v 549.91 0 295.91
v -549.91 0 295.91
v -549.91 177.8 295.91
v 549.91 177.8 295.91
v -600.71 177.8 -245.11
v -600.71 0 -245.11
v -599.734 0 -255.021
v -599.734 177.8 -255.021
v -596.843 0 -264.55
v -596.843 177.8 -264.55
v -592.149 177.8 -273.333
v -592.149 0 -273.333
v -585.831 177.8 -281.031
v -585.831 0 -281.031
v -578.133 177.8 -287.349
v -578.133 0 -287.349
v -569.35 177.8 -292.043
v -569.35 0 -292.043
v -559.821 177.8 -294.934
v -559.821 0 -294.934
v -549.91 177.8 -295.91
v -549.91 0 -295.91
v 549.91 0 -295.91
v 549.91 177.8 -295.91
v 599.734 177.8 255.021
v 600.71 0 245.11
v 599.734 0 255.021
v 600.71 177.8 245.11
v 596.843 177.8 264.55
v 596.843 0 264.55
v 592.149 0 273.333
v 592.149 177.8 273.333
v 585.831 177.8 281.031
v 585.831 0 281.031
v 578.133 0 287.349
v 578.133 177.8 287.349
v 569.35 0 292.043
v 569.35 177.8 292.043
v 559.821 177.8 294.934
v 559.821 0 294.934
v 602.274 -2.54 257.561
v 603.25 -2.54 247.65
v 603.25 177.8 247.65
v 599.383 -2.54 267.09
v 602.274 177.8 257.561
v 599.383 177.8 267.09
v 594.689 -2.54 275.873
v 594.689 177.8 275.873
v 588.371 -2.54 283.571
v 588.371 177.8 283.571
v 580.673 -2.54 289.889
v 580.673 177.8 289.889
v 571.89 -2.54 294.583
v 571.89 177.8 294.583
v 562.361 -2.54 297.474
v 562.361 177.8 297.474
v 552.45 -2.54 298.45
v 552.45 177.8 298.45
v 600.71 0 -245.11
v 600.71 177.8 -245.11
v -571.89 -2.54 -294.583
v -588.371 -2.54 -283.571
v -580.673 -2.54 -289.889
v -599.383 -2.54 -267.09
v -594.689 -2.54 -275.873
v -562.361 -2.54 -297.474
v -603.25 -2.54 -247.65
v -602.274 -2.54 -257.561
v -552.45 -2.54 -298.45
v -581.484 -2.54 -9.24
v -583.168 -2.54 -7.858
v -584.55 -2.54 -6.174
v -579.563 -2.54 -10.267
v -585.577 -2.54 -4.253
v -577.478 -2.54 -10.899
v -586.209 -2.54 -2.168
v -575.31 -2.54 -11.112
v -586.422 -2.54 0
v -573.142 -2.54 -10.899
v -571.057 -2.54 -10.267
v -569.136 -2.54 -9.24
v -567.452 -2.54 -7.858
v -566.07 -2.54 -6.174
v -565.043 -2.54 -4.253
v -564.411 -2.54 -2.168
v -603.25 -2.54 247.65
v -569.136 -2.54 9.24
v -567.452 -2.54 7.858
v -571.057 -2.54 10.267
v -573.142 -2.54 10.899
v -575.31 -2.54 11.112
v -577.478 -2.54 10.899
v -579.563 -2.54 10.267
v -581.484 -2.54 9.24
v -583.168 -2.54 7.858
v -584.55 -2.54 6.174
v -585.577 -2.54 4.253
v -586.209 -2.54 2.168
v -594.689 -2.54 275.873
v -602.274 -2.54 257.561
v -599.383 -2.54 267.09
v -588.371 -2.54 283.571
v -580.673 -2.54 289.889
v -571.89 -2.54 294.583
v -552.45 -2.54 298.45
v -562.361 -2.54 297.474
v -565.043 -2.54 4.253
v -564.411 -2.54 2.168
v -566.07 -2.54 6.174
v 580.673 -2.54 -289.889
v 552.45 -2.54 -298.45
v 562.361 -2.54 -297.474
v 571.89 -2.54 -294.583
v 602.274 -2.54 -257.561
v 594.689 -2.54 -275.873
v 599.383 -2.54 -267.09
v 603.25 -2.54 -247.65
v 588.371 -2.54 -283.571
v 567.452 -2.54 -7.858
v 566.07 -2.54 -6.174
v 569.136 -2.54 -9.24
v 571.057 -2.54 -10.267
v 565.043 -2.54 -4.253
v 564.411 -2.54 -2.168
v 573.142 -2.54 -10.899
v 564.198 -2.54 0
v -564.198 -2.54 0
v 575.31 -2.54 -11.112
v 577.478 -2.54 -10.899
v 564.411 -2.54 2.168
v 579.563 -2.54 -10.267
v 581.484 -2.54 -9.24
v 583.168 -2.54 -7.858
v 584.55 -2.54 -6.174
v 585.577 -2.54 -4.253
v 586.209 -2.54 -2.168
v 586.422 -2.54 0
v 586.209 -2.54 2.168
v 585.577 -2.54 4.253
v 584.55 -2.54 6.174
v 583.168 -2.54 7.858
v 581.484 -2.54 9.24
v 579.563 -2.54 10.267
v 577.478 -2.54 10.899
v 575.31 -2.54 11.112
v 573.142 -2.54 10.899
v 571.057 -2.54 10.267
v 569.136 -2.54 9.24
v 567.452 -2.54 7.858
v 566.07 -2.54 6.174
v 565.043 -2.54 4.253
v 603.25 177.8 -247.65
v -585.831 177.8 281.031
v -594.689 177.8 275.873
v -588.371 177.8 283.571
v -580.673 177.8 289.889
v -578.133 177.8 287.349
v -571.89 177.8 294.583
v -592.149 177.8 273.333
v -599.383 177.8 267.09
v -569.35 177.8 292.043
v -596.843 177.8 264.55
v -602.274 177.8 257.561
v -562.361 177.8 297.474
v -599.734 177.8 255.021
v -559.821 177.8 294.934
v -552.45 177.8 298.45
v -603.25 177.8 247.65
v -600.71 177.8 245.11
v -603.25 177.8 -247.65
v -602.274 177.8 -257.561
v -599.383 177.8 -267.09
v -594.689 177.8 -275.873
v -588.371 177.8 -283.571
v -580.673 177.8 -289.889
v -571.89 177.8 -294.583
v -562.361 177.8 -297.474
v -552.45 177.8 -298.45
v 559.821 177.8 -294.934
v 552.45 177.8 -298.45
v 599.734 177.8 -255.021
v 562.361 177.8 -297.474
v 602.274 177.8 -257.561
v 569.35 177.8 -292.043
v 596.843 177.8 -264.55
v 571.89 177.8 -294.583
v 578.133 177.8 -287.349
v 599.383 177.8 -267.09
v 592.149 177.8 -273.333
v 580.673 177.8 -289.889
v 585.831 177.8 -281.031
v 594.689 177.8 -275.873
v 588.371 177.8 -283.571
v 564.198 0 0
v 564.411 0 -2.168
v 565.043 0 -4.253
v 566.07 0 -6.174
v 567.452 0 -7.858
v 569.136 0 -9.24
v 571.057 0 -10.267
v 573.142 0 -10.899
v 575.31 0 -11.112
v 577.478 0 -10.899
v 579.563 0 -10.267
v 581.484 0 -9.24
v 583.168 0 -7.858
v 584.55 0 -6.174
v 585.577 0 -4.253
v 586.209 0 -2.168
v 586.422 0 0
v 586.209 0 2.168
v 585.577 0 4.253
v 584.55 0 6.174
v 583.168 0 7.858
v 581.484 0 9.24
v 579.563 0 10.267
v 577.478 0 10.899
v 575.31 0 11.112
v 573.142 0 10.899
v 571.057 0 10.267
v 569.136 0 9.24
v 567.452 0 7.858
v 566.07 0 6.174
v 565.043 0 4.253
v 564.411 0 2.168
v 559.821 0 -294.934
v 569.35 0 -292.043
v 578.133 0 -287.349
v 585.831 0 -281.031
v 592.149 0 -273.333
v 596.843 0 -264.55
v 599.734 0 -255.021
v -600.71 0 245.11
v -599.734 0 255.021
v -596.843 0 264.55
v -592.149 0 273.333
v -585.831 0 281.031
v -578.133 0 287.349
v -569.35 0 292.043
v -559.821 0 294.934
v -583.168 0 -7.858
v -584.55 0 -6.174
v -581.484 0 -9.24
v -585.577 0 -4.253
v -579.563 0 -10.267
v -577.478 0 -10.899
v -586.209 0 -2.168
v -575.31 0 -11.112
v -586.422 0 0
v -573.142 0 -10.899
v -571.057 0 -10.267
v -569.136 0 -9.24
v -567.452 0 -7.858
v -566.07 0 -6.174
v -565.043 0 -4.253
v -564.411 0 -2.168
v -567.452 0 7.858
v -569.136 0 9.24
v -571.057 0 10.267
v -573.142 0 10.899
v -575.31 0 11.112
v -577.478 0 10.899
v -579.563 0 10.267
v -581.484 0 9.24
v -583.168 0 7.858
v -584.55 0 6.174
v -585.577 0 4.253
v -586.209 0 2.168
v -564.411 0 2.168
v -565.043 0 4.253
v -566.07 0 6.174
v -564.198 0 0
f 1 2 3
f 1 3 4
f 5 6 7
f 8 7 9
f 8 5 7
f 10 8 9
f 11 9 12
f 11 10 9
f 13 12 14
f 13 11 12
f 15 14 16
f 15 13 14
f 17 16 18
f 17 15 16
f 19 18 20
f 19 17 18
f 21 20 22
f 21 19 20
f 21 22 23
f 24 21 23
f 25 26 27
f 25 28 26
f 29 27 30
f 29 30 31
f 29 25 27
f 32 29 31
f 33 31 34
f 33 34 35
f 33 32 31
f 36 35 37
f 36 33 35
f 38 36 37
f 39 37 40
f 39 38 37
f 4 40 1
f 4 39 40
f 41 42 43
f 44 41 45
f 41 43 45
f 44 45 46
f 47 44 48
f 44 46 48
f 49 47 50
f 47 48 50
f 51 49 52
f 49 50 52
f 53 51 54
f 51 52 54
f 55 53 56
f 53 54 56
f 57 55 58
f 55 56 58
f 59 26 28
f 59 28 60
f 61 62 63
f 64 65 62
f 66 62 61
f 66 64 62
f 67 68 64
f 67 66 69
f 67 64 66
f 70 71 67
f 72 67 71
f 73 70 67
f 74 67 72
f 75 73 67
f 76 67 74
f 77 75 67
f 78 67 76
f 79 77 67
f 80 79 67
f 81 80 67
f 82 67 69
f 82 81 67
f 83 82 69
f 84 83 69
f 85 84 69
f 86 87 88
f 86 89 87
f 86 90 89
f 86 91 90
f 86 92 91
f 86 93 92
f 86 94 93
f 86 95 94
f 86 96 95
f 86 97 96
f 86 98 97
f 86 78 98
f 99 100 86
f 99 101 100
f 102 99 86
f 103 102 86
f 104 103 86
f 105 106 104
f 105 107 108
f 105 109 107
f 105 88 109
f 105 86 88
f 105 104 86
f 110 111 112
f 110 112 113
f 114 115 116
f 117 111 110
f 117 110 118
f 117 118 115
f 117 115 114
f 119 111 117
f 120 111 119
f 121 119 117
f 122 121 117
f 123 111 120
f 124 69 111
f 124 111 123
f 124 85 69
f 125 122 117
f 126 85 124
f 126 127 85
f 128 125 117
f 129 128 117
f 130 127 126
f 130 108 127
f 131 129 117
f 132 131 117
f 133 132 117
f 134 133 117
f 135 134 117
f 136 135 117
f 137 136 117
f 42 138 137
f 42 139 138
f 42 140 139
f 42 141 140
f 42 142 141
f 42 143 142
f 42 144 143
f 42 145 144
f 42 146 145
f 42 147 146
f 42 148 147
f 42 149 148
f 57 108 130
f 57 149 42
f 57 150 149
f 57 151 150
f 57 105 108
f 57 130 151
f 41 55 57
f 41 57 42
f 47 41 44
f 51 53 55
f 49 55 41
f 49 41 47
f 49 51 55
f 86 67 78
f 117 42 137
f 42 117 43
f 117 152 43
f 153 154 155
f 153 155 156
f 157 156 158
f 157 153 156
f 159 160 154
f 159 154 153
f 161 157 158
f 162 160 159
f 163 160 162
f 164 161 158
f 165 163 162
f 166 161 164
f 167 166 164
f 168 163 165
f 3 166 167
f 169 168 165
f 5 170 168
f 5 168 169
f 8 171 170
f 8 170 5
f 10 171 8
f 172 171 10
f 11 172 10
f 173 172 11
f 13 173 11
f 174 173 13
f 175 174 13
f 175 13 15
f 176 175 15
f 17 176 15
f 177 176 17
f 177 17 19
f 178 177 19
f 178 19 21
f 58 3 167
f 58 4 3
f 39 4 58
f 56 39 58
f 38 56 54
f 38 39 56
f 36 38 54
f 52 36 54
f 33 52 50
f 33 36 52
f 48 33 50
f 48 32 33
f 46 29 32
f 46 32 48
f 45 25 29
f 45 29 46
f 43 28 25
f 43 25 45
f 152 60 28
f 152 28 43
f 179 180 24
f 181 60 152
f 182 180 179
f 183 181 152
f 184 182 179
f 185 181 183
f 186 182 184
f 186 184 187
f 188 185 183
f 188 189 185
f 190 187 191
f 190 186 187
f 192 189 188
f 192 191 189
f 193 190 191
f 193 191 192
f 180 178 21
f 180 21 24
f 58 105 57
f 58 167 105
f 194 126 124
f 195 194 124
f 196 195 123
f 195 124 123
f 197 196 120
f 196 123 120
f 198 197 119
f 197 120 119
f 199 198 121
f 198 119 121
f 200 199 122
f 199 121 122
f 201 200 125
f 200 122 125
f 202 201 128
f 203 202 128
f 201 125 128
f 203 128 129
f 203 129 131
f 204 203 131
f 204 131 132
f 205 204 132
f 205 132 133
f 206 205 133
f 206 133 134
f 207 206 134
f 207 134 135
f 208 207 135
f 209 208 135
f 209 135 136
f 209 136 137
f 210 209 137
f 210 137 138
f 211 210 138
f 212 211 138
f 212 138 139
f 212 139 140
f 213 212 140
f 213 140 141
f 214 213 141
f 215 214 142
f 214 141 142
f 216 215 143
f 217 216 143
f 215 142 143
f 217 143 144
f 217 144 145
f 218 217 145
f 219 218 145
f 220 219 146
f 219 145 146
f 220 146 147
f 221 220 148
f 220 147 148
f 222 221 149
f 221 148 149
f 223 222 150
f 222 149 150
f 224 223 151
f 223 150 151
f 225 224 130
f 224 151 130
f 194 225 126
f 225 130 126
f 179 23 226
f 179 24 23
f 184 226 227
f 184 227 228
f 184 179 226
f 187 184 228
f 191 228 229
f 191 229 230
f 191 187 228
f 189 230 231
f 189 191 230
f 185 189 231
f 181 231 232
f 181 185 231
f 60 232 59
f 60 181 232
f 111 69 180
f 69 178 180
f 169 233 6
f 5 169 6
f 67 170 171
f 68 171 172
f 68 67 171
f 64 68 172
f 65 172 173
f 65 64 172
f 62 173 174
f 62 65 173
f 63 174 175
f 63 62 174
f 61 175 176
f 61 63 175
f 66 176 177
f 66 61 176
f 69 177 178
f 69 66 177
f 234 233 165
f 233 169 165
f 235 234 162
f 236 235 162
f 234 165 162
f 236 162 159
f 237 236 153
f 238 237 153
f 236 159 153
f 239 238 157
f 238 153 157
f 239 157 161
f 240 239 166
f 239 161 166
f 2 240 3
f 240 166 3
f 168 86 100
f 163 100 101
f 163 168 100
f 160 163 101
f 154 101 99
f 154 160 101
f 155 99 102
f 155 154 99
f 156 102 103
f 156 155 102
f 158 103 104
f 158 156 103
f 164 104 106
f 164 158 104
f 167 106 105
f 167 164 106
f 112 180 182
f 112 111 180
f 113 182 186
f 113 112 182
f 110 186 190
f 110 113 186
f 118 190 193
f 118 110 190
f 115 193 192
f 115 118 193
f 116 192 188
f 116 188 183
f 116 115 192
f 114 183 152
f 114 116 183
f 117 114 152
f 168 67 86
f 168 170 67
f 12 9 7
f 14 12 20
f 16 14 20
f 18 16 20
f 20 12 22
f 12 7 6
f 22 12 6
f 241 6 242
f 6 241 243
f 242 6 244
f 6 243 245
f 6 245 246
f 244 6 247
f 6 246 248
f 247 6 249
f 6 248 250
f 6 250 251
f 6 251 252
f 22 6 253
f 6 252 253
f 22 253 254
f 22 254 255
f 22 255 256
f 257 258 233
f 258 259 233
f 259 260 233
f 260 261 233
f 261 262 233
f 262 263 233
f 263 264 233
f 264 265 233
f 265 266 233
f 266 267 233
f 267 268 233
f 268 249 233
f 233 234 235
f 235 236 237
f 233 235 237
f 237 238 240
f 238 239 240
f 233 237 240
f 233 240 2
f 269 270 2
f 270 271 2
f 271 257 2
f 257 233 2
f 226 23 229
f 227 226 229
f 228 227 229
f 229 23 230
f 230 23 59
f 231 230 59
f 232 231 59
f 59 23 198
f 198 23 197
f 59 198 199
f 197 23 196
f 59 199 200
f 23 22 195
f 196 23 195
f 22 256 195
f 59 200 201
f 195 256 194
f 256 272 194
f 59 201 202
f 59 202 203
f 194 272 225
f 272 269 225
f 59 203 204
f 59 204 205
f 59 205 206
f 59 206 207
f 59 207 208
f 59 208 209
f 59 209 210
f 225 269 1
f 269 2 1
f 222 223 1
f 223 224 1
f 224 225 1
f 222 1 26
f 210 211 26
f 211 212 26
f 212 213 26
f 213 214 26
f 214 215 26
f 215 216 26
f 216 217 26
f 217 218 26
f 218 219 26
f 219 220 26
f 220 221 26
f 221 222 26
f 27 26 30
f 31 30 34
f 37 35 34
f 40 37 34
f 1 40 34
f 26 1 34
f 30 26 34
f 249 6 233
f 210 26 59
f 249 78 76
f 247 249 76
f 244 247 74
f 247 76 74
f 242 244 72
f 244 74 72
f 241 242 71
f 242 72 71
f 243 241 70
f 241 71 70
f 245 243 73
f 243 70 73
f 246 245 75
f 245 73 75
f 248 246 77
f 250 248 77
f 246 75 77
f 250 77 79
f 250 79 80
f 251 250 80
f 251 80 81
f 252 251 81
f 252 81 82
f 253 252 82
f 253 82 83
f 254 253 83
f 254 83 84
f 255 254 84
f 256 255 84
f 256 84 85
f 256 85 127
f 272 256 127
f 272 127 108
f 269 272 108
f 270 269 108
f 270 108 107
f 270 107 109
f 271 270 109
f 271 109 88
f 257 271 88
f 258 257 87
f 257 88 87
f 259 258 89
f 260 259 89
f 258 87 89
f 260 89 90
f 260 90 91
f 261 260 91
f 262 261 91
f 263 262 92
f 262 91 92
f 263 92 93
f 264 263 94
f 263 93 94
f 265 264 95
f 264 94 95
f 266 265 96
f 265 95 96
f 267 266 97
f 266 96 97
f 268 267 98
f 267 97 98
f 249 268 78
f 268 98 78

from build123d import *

# Parameters (mm, degrees)
SKETCH1_W                        = 1206.5
SKETCH1_H                        = 596.9
SKETCH1_W_2                      = 1201.42
SKETCH1_H_2                      = 591.82
BOSS_EXTRUDE1_DEPTH              = 177.8
SKETCH2_W                        = 1206.5
SKETCH2_H                        = 596.9
BOSS_EXTRUDE2_DEPTH              = 2.54
FILLET1_R                        = 50.8
F_7_8_0_875_DIAMETER_HOLE1_D     = 22.225
F_7_8_0_875_DIAMETER_HOLE1_DEPTH = 2.54


with BuildPart() as part:
    # Sketch1 → Boss-Extrude1 (new body)
    with BuildSketch(Plane(origin=(0, 0, 0), x_dir=(1, 0, 0), z_dir=(0, 1, 0))):
        Rectangle(SKETCH1_W, SKETCH1_H)
        Rectangle(SKETCH1_W_2, SKETCH1_H_2, mode=Mode.SUBTRACT)
    extrude(amount=BOSS_EXTRUDE1_DEPTH)

    # Sketch2 → Boss-Extrude2 (add)
    with BuildSketch(Plane.XZ):
        Rectangle(SKETCH2_W, SKETCH2_H)
    extrude(amount=BOSS_EXTRUDE2_DEPTH)

    # Fillet1
    fillet1_edges = [part.edges().sort_by_distance(p)[0] for p in [
        (600.71, 88.9, 295.91),
        (600.71, 88.9, -295.91),
        (-600.71, 88.9, -295.91),
        (-600.71, 88.9, 295.91),
        (603.25, 87.63, 298.45),
        (-603.25, 87.63, 298.45),
        (-603.25, 87.63, -298.45),
        (603.25, 87.63, -298.45),
    ]]
    fillet(fillet1_edges, radius=FILLET1_R)

    # 7/8 (0.875) Diameter Hole1
    with Locations(Plane(origin=(0, 0, 0), x_dir=(1, 0, 0), z_dir=(0, 1, 0))):
        with Locations((575.31, 0), (-575.31, 0)):
            Hole(F_7_8_0_875_DIAMETER_HOLE1_D / 2, depth=F_7_8_0_875_DIAMETER_HOLE1_DEPTH)


solid = part.part
